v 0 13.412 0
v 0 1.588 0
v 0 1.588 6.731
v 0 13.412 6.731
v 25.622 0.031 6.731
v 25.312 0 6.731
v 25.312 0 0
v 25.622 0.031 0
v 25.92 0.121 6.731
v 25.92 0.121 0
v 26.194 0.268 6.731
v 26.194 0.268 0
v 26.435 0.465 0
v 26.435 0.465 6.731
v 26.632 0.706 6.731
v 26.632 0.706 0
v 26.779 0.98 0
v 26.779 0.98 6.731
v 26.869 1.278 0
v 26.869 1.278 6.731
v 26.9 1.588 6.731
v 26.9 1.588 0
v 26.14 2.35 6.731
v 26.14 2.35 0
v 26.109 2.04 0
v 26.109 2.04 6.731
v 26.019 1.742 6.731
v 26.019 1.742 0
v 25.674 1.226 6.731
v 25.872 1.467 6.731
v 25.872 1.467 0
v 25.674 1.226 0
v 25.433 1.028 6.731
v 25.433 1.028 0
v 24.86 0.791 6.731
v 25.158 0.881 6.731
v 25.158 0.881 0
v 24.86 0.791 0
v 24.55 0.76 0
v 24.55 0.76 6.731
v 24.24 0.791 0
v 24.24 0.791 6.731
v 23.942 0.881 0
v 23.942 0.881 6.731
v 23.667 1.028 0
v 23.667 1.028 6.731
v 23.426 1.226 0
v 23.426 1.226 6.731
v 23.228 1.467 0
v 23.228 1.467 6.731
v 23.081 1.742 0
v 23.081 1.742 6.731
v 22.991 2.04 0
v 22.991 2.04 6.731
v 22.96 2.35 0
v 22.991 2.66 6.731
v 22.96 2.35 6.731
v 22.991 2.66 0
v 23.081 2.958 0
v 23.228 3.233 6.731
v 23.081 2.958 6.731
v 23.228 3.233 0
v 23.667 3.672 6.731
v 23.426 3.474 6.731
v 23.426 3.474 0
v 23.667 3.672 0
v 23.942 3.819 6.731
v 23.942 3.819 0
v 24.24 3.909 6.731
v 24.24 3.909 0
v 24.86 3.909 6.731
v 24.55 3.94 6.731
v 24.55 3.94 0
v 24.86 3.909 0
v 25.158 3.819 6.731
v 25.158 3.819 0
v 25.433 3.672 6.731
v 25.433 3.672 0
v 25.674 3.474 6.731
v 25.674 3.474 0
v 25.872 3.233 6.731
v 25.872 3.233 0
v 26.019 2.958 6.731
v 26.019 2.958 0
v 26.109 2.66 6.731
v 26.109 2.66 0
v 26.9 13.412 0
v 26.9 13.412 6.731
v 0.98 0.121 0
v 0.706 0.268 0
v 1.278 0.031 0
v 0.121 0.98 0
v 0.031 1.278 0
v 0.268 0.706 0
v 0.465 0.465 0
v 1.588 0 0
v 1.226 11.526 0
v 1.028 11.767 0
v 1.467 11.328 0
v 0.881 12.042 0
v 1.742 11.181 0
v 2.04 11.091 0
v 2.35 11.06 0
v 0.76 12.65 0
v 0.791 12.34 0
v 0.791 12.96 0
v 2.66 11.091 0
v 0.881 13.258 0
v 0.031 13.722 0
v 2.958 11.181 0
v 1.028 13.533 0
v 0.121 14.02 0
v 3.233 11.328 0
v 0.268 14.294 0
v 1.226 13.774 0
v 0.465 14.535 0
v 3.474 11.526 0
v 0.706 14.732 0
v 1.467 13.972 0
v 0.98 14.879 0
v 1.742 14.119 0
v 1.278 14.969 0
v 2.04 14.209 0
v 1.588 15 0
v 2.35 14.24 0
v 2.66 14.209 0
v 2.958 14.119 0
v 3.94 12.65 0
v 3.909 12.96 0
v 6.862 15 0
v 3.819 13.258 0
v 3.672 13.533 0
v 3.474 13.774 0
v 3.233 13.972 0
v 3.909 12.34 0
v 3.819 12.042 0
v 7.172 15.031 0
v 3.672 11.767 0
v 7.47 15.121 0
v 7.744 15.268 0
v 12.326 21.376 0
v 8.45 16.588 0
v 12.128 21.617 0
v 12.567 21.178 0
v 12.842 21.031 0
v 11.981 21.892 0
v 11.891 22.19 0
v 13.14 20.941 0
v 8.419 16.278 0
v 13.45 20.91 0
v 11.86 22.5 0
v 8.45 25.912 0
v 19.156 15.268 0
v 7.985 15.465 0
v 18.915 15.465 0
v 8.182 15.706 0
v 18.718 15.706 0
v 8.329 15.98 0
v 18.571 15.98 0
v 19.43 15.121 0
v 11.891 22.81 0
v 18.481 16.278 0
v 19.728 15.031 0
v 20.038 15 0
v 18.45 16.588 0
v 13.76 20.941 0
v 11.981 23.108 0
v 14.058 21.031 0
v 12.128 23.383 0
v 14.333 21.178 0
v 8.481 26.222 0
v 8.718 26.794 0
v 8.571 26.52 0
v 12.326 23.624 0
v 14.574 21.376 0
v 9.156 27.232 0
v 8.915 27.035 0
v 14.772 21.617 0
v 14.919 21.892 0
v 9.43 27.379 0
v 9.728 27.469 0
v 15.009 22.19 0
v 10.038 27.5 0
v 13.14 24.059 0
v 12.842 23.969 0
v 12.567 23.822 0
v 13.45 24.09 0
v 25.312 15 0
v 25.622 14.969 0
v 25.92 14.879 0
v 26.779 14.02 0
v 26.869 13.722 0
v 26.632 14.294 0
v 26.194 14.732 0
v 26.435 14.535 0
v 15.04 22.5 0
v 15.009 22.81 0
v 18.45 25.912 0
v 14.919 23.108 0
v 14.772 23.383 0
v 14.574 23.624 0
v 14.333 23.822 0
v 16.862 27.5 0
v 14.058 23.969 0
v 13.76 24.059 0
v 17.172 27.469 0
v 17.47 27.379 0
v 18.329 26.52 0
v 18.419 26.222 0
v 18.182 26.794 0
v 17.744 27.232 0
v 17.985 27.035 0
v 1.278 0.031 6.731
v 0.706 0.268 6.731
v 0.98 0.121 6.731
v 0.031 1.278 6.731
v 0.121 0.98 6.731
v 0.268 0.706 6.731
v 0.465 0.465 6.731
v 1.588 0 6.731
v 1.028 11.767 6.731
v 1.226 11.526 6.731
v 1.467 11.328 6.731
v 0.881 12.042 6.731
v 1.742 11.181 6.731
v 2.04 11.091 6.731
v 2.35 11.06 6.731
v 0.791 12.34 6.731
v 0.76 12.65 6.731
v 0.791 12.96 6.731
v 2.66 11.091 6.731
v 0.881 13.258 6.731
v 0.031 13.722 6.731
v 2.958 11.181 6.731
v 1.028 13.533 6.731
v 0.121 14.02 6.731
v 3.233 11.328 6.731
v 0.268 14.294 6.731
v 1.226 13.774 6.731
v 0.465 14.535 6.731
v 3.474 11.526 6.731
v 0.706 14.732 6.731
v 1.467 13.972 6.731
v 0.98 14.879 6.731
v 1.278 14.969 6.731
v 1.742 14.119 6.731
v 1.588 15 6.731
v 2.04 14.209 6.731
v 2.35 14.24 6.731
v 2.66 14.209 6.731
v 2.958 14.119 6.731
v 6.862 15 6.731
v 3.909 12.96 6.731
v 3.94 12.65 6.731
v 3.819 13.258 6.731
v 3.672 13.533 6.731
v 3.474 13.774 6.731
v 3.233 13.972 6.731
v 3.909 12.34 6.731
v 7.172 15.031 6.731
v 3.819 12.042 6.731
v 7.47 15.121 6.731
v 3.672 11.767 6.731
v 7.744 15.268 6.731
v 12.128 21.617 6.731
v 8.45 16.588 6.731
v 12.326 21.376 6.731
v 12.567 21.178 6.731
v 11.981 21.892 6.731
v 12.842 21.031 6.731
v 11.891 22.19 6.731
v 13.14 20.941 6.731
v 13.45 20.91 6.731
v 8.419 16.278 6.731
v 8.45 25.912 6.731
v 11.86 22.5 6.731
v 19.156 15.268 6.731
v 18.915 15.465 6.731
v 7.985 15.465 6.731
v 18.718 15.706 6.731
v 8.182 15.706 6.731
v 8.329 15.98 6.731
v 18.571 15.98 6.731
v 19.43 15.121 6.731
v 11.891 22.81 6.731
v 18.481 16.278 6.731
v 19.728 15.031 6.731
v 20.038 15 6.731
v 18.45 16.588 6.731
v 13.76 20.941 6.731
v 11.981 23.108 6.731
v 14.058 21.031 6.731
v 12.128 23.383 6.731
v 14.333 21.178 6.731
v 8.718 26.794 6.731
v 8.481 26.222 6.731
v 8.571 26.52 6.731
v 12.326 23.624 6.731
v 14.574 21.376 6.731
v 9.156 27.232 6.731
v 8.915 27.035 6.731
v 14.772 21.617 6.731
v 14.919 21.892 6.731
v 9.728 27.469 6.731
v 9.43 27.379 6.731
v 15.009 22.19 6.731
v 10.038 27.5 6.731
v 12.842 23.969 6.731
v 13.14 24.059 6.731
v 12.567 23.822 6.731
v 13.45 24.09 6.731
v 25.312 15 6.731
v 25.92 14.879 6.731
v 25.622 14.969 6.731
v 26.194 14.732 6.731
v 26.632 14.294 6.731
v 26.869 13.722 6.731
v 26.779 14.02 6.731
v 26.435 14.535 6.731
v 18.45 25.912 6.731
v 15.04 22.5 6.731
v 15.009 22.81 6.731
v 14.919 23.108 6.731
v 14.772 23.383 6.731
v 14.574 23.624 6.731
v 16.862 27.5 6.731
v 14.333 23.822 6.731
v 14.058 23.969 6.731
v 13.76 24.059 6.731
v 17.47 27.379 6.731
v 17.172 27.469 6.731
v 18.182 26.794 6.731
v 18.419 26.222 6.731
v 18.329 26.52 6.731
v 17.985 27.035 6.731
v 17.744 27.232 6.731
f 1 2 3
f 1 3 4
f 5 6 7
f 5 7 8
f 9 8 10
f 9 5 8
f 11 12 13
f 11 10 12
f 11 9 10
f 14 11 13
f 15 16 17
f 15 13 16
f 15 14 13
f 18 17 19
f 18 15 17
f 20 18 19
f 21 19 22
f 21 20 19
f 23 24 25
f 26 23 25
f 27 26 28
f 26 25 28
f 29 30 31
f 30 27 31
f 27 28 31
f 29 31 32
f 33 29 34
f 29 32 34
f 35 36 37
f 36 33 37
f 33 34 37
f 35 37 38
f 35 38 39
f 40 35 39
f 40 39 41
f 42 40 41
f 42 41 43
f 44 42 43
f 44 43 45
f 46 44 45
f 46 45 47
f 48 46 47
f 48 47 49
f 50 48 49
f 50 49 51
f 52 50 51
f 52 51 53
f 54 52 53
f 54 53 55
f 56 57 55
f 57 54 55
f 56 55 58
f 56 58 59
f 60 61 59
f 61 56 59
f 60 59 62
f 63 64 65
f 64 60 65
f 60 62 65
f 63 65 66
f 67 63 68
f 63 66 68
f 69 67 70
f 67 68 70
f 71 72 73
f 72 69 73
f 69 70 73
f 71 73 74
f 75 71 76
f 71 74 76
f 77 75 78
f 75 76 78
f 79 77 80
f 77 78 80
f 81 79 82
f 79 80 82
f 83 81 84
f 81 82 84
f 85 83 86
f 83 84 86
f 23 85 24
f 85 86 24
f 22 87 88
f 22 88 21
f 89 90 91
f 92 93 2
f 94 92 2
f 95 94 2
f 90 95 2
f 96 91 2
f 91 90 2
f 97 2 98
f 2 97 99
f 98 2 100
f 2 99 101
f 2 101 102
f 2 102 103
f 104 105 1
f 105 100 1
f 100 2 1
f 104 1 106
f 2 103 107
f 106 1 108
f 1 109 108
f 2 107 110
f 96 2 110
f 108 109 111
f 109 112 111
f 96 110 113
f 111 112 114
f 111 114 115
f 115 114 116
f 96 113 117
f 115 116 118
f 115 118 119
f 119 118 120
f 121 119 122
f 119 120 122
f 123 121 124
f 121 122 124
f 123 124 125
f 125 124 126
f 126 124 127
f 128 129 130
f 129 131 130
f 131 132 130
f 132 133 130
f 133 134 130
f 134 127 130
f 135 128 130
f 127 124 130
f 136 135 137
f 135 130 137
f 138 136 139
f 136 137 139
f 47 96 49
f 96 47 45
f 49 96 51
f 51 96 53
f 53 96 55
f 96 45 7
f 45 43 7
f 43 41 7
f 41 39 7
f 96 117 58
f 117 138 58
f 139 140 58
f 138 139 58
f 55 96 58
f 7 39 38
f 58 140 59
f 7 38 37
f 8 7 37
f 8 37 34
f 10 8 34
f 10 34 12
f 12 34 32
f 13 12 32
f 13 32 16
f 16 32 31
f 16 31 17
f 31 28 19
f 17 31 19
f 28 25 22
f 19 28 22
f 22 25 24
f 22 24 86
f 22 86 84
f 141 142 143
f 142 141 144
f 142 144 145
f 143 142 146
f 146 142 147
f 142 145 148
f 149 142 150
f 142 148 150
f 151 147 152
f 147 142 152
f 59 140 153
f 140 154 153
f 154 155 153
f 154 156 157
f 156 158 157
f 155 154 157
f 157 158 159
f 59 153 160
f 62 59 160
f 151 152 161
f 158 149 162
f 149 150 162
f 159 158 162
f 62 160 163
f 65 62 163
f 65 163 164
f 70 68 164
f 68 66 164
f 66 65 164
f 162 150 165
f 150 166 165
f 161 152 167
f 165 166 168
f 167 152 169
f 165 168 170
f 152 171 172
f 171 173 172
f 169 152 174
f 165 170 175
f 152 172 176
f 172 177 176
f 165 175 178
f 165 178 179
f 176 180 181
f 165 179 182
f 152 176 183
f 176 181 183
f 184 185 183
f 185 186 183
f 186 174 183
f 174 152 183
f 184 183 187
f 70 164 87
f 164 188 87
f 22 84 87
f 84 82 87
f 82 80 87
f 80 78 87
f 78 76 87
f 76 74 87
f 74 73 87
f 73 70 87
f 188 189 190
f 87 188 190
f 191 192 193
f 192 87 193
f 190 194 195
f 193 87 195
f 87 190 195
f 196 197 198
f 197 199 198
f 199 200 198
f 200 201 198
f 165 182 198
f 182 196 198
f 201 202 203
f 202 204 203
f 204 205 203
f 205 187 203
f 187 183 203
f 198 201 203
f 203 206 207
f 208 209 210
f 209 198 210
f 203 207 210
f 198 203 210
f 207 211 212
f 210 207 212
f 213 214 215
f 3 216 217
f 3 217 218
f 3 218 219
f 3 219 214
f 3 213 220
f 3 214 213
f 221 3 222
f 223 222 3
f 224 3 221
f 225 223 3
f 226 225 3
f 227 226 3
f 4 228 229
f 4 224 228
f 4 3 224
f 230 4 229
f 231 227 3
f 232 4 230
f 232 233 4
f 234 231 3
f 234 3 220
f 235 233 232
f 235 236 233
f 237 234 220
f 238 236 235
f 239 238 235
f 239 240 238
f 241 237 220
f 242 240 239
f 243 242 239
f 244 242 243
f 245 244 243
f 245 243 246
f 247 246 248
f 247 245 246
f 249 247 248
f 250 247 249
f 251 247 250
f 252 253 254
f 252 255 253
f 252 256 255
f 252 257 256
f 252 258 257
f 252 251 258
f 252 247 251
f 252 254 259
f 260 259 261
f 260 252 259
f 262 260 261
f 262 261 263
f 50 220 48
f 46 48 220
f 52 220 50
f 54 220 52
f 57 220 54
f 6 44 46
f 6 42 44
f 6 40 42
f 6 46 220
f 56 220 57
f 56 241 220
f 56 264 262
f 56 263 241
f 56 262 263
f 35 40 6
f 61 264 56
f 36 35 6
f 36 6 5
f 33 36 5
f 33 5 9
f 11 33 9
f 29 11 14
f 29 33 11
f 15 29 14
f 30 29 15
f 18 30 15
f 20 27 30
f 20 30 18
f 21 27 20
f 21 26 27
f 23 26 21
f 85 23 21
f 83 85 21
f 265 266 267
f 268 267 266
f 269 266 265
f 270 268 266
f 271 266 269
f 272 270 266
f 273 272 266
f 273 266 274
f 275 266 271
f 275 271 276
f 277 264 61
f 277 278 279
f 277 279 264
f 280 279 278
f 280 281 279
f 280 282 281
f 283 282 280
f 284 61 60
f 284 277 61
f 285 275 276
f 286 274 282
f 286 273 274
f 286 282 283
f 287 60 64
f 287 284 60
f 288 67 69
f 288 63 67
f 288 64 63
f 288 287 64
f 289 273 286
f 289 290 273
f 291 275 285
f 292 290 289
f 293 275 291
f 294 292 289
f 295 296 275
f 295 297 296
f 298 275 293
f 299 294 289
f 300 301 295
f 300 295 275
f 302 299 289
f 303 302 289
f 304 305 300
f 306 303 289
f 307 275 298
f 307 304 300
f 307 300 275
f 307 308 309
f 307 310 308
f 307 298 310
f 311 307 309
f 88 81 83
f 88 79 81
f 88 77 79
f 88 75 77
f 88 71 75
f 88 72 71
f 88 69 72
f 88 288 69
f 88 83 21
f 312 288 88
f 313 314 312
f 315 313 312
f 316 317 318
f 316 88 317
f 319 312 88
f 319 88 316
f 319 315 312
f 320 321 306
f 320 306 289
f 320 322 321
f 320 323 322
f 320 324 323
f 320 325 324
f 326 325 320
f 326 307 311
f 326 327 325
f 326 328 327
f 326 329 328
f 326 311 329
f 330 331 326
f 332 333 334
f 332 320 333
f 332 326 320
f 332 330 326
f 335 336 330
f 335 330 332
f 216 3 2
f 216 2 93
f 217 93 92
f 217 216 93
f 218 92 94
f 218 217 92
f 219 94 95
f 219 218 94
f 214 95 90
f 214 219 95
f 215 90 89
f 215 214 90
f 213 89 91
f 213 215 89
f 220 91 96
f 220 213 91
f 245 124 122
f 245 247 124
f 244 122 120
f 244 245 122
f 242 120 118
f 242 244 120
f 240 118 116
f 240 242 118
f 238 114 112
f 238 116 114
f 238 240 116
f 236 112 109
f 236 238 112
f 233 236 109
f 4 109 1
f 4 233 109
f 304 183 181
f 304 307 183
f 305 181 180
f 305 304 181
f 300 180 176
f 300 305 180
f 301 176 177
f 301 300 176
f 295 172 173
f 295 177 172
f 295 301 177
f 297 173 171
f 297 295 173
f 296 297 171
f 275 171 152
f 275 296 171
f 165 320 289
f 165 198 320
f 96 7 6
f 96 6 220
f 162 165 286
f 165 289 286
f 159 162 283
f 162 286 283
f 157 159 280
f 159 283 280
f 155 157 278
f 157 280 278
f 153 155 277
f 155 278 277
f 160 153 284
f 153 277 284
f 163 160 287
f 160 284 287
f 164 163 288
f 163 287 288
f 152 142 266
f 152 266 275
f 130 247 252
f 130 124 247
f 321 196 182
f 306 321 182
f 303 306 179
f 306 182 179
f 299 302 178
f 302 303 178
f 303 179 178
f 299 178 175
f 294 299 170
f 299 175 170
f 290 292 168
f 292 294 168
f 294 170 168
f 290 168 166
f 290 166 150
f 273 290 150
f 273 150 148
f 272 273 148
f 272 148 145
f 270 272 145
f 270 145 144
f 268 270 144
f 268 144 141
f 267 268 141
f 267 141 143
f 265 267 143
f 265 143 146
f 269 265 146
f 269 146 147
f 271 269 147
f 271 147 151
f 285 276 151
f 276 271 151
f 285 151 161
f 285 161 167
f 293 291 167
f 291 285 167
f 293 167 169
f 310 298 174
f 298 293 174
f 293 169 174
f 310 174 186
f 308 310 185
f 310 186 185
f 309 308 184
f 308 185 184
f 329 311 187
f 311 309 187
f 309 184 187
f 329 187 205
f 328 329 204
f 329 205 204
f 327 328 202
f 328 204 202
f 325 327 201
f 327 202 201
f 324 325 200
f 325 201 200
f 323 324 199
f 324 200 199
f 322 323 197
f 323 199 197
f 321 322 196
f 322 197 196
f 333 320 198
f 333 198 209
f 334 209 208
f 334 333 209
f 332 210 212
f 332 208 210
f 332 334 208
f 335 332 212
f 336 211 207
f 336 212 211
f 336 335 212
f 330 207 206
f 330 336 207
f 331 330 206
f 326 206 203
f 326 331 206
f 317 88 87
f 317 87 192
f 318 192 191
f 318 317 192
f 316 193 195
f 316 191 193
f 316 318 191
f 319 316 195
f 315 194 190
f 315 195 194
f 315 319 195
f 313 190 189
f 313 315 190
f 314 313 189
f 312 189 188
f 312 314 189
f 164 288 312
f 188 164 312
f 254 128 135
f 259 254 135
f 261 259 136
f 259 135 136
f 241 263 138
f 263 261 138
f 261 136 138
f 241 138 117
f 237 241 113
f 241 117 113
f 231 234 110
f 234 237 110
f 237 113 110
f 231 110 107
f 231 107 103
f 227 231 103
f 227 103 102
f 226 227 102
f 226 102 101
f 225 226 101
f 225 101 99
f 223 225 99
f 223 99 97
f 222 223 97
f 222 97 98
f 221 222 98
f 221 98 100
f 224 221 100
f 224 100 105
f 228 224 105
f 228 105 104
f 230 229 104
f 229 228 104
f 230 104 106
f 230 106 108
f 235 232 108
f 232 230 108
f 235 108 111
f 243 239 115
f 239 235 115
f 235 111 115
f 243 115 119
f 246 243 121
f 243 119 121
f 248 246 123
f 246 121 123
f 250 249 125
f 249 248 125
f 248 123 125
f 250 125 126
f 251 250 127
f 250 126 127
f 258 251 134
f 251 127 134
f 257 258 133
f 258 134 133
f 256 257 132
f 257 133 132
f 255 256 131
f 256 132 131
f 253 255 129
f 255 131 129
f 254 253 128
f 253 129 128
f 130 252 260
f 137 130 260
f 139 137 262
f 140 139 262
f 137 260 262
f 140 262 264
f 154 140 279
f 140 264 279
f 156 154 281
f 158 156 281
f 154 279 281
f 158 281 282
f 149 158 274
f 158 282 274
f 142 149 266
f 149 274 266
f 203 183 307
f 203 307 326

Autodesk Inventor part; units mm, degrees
ref_plane "YZ Plane" through (0, 0, 0) normal (1, 0, 0) x (0, 1, 0)
ref_plane "XZ Plane" through (0, 0, 0) normal (0, 1, 0) x (-1, 0, 0)
ref_plane "XY Plane" through (0, 0, 0) normal (0, 0, 1) x (1, 0, 0)
sketch "Sketch1" plane through (0, 0, 0) normal (0, 0, 1) x (1, 0, 0)
  circle A0 centre (13.45, 22.5) radius 1.59
  circle A1 centre (2.35, 12.65) radius 1.59
  circle A2 centre (24.55, 2.35) radius 1.59
  line L0 (0, 0) -> (0, 15)
  line L1 (0, 15) -> (8.45, 15)
  line L2 (8.45, 15) -> (8.45, 27.5)
  line L3 (8.45, 27.5) -> (18.45, 27.5)
  line L4 (18.45, 27.5) -> (18.45, 15)
  line L5 (18.45, 15) -> (26.9, 15)
  line L6 (26.9, 15) -> (26.9, 0)
  line L7 (26.9, 0) -> (0, 0)
  point P0 (13.45, 27.5)
  dimension "d8" = 3.18
  dimension "d9" = 10.3
  dimension "d10" = 22.2
  dimension "d18" = 15
  dimension "d19" = 2.35
  dimension "d20" = 2.35
  dimension "d21" = 2.35
  dimension "d22" = 2.35
  dimension "d24" = 26.9
  dimension "d27" = 5
  dimension "d30" = 12.5
  dimension "d32" = 10
  dimension "d33" = 8.45
  dimension "d34" = 8.45
extrude "Extrusion1" add sketch "Sketch1" along normal blind 6.731
fillet "Fillet1" radius 1.5875 8 edges at (18.45, 15, 3.3655) (8.45, 15, 3.3655) (0, 0, 3.3655) (26.9, 0, 3.3655) (0, 15, 3.3655) (8.45, 27.5, 3.3655) (18.45, 27.5, 3.3655) (26.9, 15, 3.3655)
equation "\"d19\" = d22"
equation "\"d20\" = d19"
equation "\"d21\" = d19"
equation "\"d33\" = d34"
equation "\"d2\" = THICKB"
equation "\"THICKA\" = 3.175"
equation "\"THICKB\" = 6.731"
equation "\"THICKC\" = 12.7"
equation "\"BALLDIA\" = 12"
equation "\"MAGDIA\" = 9.5"
equation "\"THICKPLY\" = 5"
properties part number "EndStop_Bracket"
